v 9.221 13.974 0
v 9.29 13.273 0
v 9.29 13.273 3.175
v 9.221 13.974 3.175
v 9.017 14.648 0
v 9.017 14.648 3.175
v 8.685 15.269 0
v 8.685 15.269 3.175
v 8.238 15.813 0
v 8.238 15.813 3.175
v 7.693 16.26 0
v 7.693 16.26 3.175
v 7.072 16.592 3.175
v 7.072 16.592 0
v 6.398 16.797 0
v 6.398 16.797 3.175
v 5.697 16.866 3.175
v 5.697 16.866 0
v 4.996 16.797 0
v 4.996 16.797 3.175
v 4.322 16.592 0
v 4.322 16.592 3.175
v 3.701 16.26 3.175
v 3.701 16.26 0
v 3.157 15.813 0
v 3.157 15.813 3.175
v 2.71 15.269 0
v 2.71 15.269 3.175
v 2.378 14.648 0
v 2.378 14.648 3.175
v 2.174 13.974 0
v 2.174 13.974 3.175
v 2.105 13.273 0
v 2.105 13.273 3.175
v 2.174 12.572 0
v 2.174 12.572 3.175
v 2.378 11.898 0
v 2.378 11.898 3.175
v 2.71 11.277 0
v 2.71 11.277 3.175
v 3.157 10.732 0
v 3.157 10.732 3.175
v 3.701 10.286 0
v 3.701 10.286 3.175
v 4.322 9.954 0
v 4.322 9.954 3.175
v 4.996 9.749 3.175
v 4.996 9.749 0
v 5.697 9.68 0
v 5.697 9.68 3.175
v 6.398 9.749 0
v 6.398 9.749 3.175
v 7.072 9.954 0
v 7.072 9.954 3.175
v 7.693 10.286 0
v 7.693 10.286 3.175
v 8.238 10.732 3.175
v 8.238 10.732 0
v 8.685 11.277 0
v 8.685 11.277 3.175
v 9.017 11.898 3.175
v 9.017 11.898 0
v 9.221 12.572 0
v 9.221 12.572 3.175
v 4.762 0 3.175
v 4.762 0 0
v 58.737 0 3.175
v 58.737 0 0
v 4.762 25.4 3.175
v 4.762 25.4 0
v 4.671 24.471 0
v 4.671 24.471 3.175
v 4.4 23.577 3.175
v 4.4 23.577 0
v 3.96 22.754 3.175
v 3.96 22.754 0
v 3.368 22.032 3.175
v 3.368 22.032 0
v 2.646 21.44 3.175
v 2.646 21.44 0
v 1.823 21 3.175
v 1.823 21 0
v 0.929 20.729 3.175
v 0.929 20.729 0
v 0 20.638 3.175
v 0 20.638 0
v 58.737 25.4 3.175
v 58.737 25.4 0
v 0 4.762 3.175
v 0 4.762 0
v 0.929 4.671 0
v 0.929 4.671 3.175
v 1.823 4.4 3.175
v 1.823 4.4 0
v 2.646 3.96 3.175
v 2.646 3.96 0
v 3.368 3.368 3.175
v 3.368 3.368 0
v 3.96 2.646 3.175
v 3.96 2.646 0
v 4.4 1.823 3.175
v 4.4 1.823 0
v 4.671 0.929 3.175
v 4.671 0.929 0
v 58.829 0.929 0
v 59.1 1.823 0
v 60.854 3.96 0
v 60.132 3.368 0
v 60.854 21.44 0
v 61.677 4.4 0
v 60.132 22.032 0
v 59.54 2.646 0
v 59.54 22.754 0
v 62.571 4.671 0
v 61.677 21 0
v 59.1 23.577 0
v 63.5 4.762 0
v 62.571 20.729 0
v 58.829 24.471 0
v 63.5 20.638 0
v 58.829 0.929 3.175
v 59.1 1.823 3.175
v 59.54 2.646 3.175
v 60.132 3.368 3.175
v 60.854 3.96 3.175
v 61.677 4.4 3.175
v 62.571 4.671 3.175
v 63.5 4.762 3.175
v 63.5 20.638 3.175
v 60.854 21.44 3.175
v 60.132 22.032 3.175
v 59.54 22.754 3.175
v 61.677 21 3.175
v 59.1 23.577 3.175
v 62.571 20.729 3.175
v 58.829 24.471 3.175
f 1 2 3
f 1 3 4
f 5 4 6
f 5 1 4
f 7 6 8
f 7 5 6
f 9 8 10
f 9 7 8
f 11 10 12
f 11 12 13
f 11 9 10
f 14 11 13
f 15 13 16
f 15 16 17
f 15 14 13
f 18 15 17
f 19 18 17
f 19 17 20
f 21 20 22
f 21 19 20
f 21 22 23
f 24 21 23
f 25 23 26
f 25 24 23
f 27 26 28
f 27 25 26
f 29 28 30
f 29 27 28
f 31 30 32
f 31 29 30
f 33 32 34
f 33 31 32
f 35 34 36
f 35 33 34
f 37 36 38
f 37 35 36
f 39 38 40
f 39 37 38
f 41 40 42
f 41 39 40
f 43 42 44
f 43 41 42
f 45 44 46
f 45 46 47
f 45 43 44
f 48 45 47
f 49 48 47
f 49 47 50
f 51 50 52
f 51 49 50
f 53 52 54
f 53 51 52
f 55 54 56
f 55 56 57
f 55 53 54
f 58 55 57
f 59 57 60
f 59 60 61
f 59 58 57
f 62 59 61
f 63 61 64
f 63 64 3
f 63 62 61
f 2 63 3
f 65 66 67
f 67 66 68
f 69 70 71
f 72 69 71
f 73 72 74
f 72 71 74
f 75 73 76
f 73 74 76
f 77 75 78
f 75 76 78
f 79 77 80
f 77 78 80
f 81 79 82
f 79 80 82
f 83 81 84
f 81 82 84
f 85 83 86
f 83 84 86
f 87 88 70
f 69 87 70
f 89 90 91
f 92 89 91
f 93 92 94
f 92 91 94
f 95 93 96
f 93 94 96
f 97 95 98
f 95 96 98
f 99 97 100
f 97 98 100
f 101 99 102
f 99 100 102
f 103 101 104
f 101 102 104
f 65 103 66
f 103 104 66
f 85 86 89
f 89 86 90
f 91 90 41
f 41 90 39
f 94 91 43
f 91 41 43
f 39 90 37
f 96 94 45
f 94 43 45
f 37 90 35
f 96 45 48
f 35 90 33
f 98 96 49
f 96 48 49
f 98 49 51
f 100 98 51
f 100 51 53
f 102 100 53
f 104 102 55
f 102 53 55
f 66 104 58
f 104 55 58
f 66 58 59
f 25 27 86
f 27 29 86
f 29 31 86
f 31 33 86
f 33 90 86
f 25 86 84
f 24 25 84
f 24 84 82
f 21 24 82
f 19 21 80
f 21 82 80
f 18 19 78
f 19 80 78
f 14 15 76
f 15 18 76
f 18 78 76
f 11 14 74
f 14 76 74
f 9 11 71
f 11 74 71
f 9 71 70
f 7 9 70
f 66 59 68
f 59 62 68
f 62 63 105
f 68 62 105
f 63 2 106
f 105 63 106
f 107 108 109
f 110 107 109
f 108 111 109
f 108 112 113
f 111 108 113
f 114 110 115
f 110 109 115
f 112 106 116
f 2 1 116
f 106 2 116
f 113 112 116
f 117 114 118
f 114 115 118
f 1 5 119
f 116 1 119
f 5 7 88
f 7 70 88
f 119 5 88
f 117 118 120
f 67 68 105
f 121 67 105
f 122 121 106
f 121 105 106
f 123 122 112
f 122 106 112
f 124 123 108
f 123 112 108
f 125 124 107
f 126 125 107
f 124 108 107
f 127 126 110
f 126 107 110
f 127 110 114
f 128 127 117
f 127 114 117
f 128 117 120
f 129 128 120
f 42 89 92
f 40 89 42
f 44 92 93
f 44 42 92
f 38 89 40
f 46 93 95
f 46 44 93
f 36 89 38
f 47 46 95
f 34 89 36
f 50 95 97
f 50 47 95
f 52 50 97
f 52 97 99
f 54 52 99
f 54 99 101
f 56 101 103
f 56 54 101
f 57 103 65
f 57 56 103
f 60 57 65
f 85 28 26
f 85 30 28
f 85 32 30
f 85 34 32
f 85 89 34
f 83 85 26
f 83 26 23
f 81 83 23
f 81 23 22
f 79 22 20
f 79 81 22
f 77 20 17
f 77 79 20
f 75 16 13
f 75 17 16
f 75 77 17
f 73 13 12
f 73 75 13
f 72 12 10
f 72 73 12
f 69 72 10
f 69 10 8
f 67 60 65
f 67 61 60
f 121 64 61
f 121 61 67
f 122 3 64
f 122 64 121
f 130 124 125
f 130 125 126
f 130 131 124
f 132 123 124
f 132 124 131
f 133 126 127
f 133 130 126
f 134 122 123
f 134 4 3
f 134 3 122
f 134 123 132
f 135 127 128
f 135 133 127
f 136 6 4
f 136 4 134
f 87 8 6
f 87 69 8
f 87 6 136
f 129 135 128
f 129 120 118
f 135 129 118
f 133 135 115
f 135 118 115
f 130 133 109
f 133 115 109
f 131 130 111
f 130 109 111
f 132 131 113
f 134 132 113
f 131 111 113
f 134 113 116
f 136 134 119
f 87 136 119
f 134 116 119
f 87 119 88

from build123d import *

# Parameters (mm, degrees)
F0_R     = 3.592825
F1_DEPTH = 3.175


with BuildPart() as f1:
    # F0 (on Top) → F1 (new body)
    with BuildSketch(Plane.XY):
        with BuildLine():
            ThreePointArc((0, 4.7625), (3.367596, 3.367596), (4.7625, 0))
            Line((4.7625, 0), (58.7375, 0))
            ThreePointArc((58.7375, 0), (60.132404, 3.367596), (63.5, 4.7625))
            Line((63.5, 4.7625), (63.5, 20.6375))
            ThreePointArc((63.5, 20.6375), (60.132404, 22.032404), (58.7375, 25.4))
            Line((58.7375, 25.4), (4.7625, 25.4))
            ThreePointArc((4.7625, 25.4), (3.367596, 22.032404), (0, 20.6375))
            Line((0, 20.6375), (0, 4.7625))
        make_face()
        with Locations((5.697345, 13.27287)):
            Circle(F0_R, mode=Mode.SUBTRACT)
    extrude(amount=F1_DEPTH)


solid = f1.part
